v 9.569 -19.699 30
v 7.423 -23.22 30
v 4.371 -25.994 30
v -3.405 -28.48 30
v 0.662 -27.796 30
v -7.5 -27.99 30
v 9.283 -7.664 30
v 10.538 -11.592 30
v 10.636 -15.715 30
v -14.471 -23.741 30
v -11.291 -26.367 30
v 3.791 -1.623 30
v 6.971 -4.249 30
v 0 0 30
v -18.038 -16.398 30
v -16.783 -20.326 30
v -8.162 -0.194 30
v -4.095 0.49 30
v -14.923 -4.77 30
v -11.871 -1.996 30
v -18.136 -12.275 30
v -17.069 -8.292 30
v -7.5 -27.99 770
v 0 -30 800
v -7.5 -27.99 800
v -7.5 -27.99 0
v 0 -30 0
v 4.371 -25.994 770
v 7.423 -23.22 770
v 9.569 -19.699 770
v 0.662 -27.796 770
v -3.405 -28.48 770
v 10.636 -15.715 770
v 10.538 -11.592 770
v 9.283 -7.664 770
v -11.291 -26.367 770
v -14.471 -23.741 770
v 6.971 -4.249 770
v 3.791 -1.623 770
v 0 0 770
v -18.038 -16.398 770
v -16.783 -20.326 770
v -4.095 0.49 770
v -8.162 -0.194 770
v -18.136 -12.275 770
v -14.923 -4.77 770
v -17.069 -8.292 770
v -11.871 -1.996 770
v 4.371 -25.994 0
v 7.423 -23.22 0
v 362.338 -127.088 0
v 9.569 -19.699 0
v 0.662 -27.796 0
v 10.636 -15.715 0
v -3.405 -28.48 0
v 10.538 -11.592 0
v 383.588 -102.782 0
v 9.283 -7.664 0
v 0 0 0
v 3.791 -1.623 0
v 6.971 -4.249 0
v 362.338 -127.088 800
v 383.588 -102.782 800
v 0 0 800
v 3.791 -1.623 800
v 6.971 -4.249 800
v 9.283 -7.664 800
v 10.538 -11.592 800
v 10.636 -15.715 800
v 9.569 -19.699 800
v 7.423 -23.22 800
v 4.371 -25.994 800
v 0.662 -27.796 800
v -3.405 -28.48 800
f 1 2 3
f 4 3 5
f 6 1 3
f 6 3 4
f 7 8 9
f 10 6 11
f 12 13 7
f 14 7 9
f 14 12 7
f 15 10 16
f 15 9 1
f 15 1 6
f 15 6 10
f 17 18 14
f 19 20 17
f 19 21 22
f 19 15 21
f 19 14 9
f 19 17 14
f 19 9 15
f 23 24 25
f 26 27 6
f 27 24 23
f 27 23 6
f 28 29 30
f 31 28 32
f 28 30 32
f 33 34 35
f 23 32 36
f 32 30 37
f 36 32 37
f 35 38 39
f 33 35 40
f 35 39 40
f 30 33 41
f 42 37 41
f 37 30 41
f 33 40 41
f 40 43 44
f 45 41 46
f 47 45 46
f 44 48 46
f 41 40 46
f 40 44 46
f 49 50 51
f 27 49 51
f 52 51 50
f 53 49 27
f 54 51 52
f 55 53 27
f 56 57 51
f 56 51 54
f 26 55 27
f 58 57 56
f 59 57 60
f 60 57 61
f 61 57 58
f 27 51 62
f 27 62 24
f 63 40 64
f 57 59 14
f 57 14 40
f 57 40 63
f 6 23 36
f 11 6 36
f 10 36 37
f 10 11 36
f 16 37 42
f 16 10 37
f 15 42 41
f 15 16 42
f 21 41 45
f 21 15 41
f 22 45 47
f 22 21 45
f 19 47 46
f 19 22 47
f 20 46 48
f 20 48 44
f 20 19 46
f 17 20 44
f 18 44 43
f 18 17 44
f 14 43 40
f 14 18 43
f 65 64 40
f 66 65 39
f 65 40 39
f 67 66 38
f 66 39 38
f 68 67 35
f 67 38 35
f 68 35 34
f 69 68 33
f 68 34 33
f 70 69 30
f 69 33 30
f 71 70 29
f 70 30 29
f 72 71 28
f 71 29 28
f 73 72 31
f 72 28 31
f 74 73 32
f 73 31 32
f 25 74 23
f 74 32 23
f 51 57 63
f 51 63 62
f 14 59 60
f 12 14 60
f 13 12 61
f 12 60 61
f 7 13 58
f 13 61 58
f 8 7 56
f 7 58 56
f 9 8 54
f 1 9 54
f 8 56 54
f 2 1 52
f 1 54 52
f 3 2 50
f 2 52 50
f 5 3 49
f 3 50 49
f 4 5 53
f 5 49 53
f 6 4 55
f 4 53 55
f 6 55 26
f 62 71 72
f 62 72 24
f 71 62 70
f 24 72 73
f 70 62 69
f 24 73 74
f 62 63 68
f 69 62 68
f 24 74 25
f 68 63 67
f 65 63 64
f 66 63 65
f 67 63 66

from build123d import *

# Parameters (mm, degrees)
AUFSATZ_LINEAR_AUSTRAGEN1_DEPTH = 800
SKIZZE3_R                       = 14.488887394
AUFSATZ_LINEAR_AUSTRAGEN2_DEPTH = 800
SKIZZE5_R                       = 14.488887394
SCHNITT_LINEAR_AUSTRAGEN1_DEPTH = 30
LINEARES_MUSTER1_COUNT          = 2
LINEARES_MUSTER1_PITCH          = 770


with BuildPart() as part:
    # Skizze1 → Aufsatz-Linear austragen1 (new body)
    with BuildSketch(Plane.XY):
        Polygon((0, 0), (383.588464136, -102.782219191), (362.338095958, -127.088200199), (0, -30), (-7.5, -27.990381057), align=None)
    extrude(amount=AUFSATZ_LINEAR_AUSTRAGEN1_DEPTH)

    # Skizze3 → Aufsatz-Linear austragen2 (add)
    with BuildSketch(Plane(origin=(0, 0, 0), x_dir=(-1, 0, 0), z_dir=(0, 0, -1))):
        with Locations((3.75, -13.995190528)):
            Circle(SKIZZE3_R)
    extrude(amount=-AUFSATZ_LINEAR_AUSTRAGEN2_DEPTH)

    # Skizze5 → Schnitt-Linear austragen1 (cut)
    with BuildSketch(Plane(origin=(0, 0, 0), x_dir=(-1, 0, 0), z_dir=(0, 0, -1))):
        with Locations((3.75, -13.995190528)):
            Circle(SKIZZE5_R)
    schnitt_linear_austragen1 = extrude(amount=-SCHNITT_LINEAR_AUSTRAGEN1_DEPTH, mode=Mode.SUBTRACT)

    # Lineares Muster1: Schnitt-Linear austragen1 ×2
    with Locations(*[(0, 0, i * LINEARES_MUSTER1_PITCH) for i in range(1, LINEARES_MUSTER1_COUNT)]):
        add(schnitt_linear_austragen1, mode=Mode.SUBTRACT)


solid = part.part
